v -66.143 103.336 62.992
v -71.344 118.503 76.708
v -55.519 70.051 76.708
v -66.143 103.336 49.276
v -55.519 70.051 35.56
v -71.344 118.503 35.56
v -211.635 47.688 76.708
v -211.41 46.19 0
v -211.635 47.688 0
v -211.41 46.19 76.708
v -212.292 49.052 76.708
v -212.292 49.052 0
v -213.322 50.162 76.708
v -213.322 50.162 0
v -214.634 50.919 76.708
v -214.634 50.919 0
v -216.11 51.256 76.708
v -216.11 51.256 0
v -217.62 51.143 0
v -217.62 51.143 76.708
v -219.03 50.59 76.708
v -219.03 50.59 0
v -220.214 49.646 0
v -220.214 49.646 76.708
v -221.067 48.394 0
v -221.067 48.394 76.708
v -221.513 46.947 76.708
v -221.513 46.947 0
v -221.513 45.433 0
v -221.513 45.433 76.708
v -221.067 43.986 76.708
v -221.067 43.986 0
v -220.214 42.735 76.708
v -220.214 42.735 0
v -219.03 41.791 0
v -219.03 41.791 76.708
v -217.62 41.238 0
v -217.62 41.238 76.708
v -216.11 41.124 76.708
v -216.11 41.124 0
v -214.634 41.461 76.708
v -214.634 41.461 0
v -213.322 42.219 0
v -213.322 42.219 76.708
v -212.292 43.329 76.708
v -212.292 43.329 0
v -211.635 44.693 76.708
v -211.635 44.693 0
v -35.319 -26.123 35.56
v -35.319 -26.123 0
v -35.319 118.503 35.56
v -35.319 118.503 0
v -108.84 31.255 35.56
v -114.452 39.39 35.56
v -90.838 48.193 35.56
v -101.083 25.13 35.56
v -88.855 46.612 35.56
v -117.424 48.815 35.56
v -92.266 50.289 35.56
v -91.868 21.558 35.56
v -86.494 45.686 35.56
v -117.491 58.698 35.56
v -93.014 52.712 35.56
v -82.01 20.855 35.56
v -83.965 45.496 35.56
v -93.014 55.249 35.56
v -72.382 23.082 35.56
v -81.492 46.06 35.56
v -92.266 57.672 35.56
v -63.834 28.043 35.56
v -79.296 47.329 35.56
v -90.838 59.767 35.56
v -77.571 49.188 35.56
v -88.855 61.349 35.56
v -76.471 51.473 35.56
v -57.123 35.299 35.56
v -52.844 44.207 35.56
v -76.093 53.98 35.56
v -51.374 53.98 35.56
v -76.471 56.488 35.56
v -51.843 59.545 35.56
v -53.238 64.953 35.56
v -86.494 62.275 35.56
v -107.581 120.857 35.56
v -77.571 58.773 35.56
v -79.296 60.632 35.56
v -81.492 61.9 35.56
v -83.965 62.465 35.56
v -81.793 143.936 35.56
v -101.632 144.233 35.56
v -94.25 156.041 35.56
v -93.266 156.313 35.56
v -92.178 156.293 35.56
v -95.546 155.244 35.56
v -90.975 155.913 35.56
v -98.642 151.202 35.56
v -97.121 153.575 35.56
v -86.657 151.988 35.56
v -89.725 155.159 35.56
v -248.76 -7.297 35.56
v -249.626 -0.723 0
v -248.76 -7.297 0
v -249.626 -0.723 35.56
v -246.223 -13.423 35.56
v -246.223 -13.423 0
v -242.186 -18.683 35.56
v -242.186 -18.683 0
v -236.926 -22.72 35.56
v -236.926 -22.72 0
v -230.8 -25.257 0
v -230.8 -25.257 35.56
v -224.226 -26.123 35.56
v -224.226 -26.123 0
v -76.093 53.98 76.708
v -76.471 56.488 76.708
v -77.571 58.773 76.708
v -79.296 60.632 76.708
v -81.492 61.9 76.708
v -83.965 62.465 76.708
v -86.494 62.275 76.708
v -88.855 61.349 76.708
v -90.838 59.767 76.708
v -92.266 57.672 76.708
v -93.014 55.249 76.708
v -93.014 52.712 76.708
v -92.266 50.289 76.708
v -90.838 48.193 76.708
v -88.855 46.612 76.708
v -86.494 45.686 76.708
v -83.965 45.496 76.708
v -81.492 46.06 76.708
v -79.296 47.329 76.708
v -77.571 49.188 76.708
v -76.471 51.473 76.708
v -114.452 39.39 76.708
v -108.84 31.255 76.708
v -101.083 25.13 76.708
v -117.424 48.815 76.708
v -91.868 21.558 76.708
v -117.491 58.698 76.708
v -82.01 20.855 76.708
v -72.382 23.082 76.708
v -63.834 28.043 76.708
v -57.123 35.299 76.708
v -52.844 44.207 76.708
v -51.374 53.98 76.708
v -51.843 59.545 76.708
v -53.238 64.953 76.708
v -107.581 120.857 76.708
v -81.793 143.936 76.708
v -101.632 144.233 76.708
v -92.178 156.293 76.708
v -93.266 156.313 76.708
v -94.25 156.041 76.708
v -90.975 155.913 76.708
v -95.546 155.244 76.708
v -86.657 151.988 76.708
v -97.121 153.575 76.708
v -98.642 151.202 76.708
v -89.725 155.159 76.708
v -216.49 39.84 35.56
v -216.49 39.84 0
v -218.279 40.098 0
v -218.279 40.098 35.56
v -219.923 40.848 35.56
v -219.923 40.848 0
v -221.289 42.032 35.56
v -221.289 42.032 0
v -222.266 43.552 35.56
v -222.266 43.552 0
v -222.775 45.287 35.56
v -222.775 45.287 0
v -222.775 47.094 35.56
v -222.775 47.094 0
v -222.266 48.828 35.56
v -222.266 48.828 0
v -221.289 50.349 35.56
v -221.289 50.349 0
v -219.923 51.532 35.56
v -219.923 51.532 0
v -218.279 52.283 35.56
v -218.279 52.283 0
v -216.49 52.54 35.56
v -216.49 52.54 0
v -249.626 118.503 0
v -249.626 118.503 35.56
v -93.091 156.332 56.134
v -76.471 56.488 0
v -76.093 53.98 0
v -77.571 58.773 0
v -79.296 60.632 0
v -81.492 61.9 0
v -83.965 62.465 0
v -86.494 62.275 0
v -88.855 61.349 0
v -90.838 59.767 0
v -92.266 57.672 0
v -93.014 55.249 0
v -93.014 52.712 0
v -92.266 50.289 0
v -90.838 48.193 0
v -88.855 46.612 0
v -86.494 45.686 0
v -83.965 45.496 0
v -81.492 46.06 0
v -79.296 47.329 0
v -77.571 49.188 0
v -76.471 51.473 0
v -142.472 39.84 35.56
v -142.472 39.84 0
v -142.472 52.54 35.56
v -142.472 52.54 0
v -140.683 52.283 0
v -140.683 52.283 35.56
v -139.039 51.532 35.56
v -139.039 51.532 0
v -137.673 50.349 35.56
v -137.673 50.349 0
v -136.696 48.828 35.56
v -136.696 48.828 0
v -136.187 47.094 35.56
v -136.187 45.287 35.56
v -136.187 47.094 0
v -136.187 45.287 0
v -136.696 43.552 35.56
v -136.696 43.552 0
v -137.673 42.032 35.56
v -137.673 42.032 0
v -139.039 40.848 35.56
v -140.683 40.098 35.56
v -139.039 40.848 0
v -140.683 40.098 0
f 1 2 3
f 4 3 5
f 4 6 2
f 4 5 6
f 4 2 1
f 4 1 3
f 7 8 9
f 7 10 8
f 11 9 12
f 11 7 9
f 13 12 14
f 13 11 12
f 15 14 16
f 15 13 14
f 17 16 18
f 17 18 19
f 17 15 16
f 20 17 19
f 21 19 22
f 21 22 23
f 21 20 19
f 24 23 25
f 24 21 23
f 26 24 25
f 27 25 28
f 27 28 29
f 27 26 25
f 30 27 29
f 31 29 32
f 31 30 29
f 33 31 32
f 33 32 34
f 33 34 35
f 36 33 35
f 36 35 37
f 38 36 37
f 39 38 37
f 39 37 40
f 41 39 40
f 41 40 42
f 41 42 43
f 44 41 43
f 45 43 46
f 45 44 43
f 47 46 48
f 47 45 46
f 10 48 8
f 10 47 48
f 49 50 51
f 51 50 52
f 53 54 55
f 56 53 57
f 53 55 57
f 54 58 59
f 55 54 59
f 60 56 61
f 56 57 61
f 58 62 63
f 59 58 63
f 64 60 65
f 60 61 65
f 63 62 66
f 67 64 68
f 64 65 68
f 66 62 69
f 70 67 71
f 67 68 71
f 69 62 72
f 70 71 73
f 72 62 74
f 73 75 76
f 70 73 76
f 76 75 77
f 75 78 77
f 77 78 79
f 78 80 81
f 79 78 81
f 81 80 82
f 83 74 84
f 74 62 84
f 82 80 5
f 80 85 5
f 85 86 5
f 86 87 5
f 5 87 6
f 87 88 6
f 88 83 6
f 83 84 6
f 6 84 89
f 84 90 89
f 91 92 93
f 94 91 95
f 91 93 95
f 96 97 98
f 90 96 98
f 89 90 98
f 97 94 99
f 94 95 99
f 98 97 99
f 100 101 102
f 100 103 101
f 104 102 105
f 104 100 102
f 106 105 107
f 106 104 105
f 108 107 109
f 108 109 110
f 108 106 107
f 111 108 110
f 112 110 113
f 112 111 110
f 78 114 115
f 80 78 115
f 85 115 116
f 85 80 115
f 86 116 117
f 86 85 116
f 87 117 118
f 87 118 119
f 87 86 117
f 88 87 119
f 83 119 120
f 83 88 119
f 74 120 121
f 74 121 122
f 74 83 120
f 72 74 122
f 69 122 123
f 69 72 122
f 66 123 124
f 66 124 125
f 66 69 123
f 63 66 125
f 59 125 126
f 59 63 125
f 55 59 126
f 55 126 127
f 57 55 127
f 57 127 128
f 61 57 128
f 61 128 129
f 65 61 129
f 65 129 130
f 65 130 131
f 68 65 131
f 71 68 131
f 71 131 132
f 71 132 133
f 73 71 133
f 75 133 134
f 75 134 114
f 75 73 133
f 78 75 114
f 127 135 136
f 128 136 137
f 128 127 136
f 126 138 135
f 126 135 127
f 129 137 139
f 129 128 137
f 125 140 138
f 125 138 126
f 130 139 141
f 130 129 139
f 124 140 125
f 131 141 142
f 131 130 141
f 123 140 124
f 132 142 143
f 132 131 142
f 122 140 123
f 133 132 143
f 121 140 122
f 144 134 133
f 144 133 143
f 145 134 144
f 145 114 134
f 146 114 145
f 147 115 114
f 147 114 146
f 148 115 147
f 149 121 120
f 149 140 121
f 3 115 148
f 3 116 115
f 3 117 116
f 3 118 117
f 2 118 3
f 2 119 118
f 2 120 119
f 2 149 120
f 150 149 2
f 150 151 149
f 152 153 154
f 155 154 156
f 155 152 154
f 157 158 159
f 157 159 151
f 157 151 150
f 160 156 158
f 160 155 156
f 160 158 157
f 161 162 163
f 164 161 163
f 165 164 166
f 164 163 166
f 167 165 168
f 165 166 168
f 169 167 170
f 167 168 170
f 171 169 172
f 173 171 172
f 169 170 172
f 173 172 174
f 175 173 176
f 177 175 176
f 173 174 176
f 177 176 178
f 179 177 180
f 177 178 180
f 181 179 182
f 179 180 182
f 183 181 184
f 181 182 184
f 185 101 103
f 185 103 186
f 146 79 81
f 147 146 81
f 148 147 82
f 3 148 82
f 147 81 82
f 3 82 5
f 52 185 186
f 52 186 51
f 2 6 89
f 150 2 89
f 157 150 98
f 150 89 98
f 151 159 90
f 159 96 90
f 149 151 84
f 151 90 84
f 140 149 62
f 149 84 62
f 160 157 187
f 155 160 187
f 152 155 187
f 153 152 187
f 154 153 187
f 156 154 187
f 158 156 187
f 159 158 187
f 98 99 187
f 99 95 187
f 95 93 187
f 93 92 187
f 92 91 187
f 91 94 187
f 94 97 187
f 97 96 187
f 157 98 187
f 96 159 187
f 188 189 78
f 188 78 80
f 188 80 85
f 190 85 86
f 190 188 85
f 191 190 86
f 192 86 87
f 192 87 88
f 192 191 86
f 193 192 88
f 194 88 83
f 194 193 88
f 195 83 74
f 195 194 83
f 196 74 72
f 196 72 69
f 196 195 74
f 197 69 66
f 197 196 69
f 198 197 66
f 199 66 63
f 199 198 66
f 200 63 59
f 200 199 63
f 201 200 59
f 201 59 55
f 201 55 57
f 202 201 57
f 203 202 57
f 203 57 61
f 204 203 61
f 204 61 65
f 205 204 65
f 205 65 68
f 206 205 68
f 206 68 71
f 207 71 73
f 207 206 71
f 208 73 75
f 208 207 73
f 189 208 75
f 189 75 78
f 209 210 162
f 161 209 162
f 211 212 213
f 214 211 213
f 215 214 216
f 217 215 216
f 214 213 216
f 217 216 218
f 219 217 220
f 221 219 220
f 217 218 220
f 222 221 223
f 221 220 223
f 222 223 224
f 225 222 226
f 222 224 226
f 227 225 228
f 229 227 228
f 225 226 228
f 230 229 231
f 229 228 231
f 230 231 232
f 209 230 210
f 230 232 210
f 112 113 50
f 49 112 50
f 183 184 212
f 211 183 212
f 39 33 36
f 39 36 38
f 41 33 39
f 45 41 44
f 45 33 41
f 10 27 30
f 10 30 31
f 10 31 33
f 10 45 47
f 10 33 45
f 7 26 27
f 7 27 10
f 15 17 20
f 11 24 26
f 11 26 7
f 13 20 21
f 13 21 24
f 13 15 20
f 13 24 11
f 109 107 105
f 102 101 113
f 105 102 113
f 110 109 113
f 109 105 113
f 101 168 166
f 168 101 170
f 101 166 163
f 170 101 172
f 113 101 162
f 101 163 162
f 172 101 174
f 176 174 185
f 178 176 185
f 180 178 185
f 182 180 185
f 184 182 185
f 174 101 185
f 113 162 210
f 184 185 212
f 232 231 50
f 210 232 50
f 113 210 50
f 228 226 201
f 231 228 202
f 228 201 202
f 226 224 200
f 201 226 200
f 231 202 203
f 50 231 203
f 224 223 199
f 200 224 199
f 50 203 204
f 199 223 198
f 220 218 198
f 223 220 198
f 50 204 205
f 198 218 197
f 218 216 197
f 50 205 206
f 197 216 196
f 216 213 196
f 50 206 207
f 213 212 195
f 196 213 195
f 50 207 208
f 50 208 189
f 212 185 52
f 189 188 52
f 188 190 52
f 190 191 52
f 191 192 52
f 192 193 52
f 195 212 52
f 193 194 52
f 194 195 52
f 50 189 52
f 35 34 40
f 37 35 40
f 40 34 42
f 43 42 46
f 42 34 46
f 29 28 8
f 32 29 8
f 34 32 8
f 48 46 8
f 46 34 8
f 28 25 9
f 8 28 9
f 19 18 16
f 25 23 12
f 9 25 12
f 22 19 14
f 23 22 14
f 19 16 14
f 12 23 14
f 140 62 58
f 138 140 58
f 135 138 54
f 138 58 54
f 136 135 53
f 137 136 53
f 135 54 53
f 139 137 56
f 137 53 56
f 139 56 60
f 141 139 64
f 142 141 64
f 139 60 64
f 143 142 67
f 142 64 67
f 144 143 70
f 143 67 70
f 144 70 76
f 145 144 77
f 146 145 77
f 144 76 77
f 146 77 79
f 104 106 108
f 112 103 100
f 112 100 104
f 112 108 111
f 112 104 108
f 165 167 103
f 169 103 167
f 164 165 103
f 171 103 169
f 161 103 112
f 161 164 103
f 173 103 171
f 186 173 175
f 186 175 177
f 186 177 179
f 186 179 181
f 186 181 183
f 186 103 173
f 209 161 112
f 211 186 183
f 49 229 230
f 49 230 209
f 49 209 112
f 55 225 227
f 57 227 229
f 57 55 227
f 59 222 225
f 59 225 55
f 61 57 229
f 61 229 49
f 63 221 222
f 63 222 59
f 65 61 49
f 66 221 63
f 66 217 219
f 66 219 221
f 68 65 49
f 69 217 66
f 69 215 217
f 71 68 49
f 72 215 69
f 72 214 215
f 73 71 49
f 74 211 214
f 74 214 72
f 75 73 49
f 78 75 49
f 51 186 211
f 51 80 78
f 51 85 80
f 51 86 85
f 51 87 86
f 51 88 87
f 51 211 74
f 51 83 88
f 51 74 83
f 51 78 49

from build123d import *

# Parameters (mm, degrees)
F0_W          = 214.3064960837
F0_H          = 144.6259766817
F0_R          = 8.5081273079
F1_DEPTH      = 35.56
F3_R          = 5.08
F4_DEPTH      = 41.148
F4_DEPTH_BACK = 35.56
F2_R          = 8.5081273079
F5_DEPTH      = 41.148
F6_R          = 25.4


with BuildPart() as f1:
    # F0 (on Top) → F1 (new body)
    with BuildSketch(Plane.XY):
        with Locations((-142.4723118544, 46.1902879179)):
            Rectangle(F0_W, F0_H)
        with BuildLine():
            Line((-142.4723118544, 39.8402879179), (-216.4897322655, 39.8402879179))
            ThreePointArc((-216.4897322655, 39.8402879179), (-222.8397322655, 46.1902879179), (-216.4897322655, 52.5402879179))
            Line((-216.4897322655, 52.5402879179), (-142.4723118544, 52.5402879179))
            ThreePointArc((-142.4723118544, 52.5402879179), (-136.1223118544, 46.1902879179), (-142.4723118544, 39.8402879179))
        make_face(mode=Mode.SUBTRACT)
        with Locations((-84.6008360386, 53.9804883301)):
            Circle(F0_R, mode=Mode.SUBTRACT)
    extrude(amount=F1_DEPTH)

    # F6
    f6_edges = [f1.edges().sort_by_distance(p)[0] for p in [
        (-249.62556, -26.1227, 17.78),
    ]]
    fillet(f6_edges, radius=F6_R)


with BuildPart() as f4:
    # F3 (on face) → F4 (new body, two sides)
    with BuildSketch(Plane.XY.offset(35.56)) as f4_sk:
        with Locations((-216.4897322655, 46.1902879179)):
            Circle(F3_R)
    extrude(amount=F4_DEPTH)
    extrude(f4_sk.sketch, amount=-F4_DEPTH_BACK)


with BuildPart() as f5:
    # F2 (on face) → F5 (new body, through all)
    with BuildSketch(Plane.XY.offset(35.56)):
        with BuildLine():
            ThreePointArc((-117.4909419259, 58.6982221516), (-86.9657003677, 20.8380156645), (-51.374098647, 53.9804883301))
            ThreePointArc((-51.374098647, 53.9804883301), (-52.4269300084, 62.2784307525), (-55.5187034955, 70.0505114923))
            ThreePointArc((-55.5187034955, 70.0505114923), (-90.5878038493, 86.6633935578), (-117.4909419259, 58.6982221516))
        make_face()
        with Locations((-84.6008360386, 53.9804883301)):
            Circle(F2_R, mode=Mode.SUBTRACT)
        with BuildLine():
            ThreePointArc((-117.4909419259, 58.6982221516), (-90.5878038493, 86.6633935578), (-55.5187034955, 70.0505114923))
            add(Edge.make_bspline(
                [(-71.3437874184, 118.5032762587), (-66.2032422505, 104.1232170214), (-60.8587807347, 87.0871227133), (-55.5187034955, 70.0505114923)],
                knots=[0.8077687056, 0.8077687056, 0.8077687056, 0.8077687056, 1, 1, 1, 1], degree=3))
            Line((-71.3437874184, 118.5032762587), (-108.0454849884, 118.5032762587))
            add(Edge.make_bspline(
                [(-117.4909419259, 58.6982221516), (-114.4385454829, 79.97827864), (-111.3965044358, 101.2627998667), (-108.0454849884, 118.5032762587)],
                knots=[0, 0, 0, 0, 0.2236901556, 0.2236901556, 0.2236901556, 0.2236901556], degree=3))
        make_face()
        with BuildLine():
            Line((-108.0454849884, 118.5032762587), (-71.3437874184, 118.5032762587))
            add(Edge.make_bspline(
                [(-108.0454849884, 118.5032762587), (-103.7805881801, 140.4455102242), (-94.0039277475, 172.0230555596), (-79.3497645207, 140.8990380359), (-71.3437874184, 118.5032762587)],
                knots=[0.2236901556, 0.2236901556, 0.2236901556, 0.2236901556, 0.5083842451, 0.8077687056, 0.8077687056, 0.8077687056, 0.8077687056], degree=3))
        make_face()
    extrude(amount=F5_DEPTH)


solid = Compound([f1.part, f4.part, f5.part])
